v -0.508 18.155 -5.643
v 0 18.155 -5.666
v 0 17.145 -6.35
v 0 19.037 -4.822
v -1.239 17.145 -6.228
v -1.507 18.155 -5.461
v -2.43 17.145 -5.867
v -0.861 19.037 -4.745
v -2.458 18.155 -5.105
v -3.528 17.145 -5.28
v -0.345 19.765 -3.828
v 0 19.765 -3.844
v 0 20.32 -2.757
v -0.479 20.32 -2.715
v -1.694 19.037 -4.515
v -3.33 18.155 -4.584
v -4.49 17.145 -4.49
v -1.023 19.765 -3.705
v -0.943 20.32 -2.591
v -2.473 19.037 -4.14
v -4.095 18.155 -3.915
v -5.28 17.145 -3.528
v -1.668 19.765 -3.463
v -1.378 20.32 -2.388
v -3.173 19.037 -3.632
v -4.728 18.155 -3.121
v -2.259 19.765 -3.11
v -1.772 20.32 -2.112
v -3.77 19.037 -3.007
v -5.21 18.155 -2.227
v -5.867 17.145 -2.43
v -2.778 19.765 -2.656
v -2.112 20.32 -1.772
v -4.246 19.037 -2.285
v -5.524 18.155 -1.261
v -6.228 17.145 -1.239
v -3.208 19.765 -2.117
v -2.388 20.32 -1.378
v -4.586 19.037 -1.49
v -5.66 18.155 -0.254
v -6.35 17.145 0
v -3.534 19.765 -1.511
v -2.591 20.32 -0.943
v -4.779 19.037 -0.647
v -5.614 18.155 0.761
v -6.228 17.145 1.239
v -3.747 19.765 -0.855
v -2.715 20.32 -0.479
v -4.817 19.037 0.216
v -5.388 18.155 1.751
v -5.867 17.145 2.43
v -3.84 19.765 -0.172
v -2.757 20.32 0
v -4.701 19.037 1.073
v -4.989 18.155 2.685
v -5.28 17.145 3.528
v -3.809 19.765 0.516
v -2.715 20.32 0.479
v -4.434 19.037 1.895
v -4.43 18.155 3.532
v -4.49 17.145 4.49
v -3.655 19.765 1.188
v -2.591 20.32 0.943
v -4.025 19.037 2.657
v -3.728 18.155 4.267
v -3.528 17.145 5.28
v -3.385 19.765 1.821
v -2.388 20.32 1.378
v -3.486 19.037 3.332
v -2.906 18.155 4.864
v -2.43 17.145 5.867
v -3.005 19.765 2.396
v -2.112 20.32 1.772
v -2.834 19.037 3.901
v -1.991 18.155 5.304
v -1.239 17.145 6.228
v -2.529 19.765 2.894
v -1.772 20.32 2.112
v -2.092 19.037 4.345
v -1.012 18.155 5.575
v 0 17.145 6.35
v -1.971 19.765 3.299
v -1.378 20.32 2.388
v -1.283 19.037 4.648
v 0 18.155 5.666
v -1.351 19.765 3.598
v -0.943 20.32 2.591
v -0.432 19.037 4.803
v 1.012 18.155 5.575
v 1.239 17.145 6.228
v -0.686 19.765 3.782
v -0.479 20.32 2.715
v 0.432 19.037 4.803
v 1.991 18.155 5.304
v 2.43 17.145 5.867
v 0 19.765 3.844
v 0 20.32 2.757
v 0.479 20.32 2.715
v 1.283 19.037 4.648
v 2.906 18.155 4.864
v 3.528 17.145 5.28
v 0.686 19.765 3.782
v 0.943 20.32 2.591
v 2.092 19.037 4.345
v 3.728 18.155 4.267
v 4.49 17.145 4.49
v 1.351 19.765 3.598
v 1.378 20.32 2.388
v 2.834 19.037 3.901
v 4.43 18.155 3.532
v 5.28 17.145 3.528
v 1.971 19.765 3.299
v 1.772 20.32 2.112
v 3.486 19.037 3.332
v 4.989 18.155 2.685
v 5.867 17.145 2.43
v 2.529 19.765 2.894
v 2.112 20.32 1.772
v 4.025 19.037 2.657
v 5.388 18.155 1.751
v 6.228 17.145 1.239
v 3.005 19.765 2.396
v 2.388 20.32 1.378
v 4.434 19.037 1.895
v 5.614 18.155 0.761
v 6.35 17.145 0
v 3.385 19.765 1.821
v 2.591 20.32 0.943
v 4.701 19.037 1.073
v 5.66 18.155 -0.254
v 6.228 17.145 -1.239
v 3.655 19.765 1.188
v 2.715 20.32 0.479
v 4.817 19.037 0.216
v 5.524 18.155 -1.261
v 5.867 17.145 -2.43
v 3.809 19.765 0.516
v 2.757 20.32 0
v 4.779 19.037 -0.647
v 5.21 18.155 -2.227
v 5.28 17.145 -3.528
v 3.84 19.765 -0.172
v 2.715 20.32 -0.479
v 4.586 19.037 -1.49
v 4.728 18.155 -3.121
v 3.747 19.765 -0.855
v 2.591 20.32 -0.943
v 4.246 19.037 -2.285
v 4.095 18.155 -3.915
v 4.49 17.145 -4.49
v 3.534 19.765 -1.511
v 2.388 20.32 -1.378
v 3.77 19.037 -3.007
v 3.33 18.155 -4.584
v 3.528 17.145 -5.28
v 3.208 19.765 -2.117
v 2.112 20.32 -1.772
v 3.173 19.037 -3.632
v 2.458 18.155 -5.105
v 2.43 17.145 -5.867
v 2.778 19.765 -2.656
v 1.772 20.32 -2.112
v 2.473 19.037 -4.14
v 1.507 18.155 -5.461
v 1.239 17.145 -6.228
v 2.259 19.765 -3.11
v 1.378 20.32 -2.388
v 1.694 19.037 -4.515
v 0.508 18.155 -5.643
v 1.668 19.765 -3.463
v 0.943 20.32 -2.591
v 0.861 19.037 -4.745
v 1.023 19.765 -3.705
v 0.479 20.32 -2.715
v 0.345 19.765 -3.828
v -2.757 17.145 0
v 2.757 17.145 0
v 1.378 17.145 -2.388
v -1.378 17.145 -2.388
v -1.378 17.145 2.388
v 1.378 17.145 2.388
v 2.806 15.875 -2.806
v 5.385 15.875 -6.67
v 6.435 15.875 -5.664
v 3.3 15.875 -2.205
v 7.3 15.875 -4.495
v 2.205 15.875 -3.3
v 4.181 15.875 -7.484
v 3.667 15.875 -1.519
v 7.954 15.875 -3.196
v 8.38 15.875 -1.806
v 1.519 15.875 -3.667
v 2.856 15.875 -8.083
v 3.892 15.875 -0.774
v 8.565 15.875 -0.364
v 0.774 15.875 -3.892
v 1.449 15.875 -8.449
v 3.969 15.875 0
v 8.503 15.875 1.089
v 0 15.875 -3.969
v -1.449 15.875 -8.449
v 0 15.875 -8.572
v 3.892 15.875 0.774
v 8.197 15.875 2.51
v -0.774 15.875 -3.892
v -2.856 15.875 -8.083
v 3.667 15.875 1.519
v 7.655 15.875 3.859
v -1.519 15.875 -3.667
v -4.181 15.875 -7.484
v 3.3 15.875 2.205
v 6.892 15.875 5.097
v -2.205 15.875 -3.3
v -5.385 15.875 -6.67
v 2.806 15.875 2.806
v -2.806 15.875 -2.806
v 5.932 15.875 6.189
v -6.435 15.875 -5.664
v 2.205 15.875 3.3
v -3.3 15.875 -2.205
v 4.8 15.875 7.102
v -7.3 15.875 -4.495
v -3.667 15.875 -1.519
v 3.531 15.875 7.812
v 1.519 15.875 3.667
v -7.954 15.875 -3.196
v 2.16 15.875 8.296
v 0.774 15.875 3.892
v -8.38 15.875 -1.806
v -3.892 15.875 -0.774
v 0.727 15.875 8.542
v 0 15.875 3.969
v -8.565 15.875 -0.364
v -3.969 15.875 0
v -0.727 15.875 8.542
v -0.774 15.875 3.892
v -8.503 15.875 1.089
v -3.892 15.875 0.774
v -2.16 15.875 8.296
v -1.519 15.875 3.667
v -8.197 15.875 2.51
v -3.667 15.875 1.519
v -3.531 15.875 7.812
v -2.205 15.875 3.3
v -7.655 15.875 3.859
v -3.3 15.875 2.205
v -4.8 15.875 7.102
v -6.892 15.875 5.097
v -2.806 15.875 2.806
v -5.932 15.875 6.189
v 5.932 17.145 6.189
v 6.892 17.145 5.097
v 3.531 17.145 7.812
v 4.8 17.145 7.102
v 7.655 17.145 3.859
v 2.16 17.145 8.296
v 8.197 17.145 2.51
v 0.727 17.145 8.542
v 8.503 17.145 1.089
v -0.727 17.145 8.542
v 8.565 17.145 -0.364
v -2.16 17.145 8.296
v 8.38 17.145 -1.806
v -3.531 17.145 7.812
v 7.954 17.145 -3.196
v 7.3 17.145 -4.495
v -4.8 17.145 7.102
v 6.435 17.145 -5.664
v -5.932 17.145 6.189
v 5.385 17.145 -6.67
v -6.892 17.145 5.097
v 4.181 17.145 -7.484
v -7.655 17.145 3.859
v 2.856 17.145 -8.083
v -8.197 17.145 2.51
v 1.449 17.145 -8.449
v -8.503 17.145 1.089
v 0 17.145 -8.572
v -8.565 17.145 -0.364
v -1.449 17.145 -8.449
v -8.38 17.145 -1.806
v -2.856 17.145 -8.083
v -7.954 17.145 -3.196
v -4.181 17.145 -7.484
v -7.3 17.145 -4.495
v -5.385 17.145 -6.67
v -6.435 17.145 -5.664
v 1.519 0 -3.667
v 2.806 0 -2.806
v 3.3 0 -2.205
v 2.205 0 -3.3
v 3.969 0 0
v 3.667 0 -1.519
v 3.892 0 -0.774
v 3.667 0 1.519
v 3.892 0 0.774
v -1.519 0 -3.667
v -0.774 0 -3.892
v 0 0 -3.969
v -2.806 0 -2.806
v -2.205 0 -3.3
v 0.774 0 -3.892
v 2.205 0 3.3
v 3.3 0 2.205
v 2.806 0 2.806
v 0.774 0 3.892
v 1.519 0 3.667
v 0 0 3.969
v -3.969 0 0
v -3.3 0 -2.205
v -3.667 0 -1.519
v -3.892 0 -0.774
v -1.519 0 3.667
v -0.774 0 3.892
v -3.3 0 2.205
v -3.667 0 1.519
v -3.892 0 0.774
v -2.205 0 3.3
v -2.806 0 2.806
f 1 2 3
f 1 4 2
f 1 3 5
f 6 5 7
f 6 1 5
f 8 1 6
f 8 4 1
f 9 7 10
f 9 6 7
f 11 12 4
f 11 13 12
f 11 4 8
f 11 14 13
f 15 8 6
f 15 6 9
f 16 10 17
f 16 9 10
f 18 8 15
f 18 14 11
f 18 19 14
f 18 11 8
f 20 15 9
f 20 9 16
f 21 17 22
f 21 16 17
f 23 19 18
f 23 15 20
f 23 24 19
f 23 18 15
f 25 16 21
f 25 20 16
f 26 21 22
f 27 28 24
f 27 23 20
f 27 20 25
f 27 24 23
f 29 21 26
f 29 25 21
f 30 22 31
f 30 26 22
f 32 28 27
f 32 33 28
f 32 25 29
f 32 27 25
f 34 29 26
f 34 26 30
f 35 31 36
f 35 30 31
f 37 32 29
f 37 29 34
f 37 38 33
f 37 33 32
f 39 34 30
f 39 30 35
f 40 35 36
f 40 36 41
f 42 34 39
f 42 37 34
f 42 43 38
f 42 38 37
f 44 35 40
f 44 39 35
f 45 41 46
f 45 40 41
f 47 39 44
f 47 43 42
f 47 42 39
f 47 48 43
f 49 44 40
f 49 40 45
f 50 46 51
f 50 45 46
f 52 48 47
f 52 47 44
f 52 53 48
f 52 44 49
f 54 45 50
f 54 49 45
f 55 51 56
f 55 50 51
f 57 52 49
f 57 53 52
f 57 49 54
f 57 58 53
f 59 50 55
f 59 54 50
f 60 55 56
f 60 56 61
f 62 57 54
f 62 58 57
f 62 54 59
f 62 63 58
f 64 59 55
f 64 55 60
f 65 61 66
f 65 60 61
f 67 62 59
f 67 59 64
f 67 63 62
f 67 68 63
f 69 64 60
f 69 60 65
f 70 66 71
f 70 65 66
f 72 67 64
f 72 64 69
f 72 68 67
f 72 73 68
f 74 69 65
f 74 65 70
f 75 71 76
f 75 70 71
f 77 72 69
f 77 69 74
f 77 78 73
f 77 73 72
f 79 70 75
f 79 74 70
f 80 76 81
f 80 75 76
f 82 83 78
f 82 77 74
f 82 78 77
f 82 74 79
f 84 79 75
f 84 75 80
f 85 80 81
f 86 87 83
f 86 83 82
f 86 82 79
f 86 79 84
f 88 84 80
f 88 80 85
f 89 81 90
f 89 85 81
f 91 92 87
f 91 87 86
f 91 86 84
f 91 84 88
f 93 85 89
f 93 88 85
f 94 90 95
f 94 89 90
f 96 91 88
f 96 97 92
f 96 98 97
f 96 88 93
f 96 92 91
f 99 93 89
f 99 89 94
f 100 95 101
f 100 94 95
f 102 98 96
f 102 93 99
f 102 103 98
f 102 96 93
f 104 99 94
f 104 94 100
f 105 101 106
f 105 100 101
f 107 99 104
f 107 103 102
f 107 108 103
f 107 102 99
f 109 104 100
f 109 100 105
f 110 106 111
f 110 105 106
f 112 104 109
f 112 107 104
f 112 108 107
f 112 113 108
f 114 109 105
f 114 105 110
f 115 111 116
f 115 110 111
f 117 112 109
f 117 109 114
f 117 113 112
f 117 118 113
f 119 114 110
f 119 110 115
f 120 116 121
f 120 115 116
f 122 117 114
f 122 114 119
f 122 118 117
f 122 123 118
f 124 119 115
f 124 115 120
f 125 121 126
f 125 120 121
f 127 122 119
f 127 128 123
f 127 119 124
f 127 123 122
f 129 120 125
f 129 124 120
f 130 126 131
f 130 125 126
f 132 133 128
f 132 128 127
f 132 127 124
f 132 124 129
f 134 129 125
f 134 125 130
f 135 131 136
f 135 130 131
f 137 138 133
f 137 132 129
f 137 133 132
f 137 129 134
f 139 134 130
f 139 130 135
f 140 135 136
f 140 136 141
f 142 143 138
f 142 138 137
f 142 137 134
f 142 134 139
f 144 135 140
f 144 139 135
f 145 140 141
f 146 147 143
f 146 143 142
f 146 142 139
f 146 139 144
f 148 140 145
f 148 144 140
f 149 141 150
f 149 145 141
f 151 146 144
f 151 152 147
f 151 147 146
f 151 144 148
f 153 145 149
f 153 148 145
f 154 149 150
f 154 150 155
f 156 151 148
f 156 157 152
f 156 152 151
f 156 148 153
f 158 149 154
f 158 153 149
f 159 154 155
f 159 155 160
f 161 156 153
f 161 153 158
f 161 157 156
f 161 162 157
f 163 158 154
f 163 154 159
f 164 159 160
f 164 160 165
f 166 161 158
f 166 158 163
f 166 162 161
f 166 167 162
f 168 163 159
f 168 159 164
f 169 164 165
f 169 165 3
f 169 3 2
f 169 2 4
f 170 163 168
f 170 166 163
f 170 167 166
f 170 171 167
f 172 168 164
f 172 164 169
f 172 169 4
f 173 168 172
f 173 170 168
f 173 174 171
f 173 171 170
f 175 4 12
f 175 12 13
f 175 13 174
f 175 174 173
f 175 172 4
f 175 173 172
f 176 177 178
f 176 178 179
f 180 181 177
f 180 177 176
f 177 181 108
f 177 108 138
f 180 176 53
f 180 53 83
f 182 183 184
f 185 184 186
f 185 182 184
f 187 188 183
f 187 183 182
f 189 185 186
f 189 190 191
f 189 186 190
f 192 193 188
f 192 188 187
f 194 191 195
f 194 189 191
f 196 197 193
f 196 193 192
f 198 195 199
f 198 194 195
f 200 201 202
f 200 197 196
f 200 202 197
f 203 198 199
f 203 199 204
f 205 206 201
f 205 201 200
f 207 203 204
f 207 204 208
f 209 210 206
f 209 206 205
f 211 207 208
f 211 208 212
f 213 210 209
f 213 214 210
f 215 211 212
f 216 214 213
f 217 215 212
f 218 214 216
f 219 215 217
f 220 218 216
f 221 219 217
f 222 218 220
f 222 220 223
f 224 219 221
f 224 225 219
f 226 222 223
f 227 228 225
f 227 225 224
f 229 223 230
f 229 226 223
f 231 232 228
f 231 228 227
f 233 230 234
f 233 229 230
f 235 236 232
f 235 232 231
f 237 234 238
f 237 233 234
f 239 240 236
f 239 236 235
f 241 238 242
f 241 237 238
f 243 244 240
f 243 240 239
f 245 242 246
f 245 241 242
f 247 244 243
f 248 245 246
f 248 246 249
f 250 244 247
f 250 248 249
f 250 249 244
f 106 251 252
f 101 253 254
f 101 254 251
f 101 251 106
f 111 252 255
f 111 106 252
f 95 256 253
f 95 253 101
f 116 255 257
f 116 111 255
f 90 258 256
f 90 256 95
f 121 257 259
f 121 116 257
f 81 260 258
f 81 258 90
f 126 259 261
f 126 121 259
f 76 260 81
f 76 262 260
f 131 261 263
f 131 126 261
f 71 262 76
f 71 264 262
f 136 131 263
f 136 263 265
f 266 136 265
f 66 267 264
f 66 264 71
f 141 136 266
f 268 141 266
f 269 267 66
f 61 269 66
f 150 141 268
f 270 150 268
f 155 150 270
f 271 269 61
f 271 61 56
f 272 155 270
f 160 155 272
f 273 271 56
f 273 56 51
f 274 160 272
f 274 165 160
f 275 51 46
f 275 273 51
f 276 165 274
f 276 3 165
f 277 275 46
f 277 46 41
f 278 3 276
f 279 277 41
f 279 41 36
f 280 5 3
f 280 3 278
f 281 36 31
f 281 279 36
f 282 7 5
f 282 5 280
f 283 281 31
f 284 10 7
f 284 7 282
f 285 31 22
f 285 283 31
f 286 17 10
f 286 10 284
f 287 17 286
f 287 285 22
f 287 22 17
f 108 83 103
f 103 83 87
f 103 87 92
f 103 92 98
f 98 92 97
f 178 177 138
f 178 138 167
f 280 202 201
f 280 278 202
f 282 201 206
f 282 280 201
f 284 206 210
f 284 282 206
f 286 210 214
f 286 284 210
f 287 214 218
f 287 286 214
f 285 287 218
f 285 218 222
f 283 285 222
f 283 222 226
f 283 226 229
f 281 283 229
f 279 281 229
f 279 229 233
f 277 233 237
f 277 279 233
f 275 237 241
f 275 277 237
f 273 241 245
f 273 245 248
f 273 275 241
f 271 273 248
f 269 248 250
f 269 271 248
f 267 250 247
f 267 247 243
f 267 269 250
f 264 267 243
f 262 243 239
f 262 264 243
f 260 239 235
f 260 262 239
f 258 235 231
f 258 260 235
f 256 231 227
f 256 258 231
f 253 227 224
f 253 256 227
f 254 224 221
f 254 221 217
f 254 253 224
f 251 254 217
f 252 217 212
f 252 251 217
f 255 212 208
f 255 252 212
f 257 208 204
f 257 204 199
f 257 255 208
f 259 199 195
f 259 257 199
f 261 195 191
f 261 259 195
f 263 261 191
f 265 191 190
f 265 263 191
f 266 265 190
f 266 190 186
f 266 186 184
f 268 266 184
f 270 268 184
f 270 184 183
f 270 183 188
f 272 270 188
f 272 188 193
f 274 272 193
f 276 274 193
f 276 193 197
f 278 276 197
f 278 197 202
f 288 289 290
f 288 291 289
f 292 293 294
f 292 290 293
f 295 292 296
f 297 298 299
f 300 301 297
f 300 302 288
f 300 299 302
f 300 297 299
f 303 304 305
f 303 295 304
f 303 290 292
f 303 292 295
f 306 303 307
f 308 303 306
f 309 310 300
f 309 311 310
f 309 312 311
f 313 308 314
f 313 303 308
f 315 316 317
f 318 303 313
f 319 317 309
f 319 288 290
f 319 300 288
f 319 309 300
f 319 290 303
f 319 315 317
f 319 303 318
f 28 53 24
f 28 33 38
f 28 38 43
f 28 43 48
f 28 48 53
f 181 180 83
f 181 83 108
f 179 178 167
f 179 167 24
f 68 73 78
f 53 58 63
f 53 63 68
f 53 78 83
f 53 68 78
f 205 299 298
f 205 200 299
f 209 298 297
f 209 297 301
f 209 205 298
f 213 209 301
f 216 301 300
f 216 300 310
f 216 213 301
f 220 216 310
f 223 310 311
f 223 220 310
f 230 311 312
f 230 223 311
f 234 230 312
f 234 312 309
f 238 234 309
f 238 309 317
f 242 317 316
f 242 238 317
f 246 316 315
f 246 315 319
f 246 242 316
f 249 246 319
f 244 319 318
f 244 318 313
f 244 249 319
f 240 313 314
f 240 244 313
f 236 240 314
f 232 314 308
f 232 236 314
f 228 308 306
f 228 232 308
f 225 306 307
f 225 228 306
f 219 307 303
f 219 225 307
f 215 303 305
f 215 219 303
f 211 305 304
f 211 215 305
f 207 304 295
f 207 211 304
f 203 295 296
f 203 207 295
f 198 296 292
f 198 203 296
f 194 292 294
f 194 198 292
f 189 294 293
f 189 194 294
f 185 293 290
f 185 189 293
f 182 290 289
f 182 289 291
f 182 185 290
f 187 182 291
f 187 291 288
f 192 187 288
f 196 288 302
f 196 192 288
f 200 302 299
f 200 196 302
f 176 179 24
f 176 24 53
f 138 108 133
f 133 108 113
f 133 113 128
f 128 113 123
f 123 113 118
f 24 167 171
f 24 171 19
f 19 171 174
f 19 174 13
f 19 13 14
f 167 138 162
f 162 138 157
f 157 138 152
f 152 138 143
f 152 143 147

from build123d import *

# Parameters (mm, degrees)
HEX_CUT_DEPTH = 3.175


with BuildPart() as part:
    # Sketch1 → Screw revolve (revolve)
    with BuildSketch(Plane.XY, mode=Mode.PRIVATE) as screw_revolve_sk:
        with BuildLine():
            Line((0, 0), (3.96875, 0))
            Line((3.96875, 0), (3.96875, 15.875))
            Line((3.96875, 15.875), (8.5725, 15.875))
            Line((8.5725, 15.875), (8.5725, 17.145))
            Line((8.5725, 17.145), (6.35, 17.145))
            ThreePointArc((6.35, 17.145), (4.822276438, 19.036685873), (2.756963005, 20.32))
            Line((2.756963005, 20.32), (0, 20.32))
            Line((0, 20.32), (0, 0))
        make_face()
    revolve(screw_revolve_sk.sketch.rotate(Axis((0, 0, 0), (0, 1, 0)), 90), axis=Axis((0, 0, 0), (0, 1, 0)))

    # Sketch2 → Hex Cut (cut)
    with BuildSketch(Plane(origin=(0, 20.32, 0), x_dir=(-1, 0, 0), z_dir=(0, 1, 0))):
        Polygon((-2.756963005, 0), (-1.378481503, -2.3876), (1.378481503, -2.3876), (2.756963005, 0), (1.378481503, 2.3876), (-1.378481503, 2.3876), align=None)
    extrude(amount=-HEX_CUT_DEPTH, mode=Mode.SUBTRACT)


solid = part.part
